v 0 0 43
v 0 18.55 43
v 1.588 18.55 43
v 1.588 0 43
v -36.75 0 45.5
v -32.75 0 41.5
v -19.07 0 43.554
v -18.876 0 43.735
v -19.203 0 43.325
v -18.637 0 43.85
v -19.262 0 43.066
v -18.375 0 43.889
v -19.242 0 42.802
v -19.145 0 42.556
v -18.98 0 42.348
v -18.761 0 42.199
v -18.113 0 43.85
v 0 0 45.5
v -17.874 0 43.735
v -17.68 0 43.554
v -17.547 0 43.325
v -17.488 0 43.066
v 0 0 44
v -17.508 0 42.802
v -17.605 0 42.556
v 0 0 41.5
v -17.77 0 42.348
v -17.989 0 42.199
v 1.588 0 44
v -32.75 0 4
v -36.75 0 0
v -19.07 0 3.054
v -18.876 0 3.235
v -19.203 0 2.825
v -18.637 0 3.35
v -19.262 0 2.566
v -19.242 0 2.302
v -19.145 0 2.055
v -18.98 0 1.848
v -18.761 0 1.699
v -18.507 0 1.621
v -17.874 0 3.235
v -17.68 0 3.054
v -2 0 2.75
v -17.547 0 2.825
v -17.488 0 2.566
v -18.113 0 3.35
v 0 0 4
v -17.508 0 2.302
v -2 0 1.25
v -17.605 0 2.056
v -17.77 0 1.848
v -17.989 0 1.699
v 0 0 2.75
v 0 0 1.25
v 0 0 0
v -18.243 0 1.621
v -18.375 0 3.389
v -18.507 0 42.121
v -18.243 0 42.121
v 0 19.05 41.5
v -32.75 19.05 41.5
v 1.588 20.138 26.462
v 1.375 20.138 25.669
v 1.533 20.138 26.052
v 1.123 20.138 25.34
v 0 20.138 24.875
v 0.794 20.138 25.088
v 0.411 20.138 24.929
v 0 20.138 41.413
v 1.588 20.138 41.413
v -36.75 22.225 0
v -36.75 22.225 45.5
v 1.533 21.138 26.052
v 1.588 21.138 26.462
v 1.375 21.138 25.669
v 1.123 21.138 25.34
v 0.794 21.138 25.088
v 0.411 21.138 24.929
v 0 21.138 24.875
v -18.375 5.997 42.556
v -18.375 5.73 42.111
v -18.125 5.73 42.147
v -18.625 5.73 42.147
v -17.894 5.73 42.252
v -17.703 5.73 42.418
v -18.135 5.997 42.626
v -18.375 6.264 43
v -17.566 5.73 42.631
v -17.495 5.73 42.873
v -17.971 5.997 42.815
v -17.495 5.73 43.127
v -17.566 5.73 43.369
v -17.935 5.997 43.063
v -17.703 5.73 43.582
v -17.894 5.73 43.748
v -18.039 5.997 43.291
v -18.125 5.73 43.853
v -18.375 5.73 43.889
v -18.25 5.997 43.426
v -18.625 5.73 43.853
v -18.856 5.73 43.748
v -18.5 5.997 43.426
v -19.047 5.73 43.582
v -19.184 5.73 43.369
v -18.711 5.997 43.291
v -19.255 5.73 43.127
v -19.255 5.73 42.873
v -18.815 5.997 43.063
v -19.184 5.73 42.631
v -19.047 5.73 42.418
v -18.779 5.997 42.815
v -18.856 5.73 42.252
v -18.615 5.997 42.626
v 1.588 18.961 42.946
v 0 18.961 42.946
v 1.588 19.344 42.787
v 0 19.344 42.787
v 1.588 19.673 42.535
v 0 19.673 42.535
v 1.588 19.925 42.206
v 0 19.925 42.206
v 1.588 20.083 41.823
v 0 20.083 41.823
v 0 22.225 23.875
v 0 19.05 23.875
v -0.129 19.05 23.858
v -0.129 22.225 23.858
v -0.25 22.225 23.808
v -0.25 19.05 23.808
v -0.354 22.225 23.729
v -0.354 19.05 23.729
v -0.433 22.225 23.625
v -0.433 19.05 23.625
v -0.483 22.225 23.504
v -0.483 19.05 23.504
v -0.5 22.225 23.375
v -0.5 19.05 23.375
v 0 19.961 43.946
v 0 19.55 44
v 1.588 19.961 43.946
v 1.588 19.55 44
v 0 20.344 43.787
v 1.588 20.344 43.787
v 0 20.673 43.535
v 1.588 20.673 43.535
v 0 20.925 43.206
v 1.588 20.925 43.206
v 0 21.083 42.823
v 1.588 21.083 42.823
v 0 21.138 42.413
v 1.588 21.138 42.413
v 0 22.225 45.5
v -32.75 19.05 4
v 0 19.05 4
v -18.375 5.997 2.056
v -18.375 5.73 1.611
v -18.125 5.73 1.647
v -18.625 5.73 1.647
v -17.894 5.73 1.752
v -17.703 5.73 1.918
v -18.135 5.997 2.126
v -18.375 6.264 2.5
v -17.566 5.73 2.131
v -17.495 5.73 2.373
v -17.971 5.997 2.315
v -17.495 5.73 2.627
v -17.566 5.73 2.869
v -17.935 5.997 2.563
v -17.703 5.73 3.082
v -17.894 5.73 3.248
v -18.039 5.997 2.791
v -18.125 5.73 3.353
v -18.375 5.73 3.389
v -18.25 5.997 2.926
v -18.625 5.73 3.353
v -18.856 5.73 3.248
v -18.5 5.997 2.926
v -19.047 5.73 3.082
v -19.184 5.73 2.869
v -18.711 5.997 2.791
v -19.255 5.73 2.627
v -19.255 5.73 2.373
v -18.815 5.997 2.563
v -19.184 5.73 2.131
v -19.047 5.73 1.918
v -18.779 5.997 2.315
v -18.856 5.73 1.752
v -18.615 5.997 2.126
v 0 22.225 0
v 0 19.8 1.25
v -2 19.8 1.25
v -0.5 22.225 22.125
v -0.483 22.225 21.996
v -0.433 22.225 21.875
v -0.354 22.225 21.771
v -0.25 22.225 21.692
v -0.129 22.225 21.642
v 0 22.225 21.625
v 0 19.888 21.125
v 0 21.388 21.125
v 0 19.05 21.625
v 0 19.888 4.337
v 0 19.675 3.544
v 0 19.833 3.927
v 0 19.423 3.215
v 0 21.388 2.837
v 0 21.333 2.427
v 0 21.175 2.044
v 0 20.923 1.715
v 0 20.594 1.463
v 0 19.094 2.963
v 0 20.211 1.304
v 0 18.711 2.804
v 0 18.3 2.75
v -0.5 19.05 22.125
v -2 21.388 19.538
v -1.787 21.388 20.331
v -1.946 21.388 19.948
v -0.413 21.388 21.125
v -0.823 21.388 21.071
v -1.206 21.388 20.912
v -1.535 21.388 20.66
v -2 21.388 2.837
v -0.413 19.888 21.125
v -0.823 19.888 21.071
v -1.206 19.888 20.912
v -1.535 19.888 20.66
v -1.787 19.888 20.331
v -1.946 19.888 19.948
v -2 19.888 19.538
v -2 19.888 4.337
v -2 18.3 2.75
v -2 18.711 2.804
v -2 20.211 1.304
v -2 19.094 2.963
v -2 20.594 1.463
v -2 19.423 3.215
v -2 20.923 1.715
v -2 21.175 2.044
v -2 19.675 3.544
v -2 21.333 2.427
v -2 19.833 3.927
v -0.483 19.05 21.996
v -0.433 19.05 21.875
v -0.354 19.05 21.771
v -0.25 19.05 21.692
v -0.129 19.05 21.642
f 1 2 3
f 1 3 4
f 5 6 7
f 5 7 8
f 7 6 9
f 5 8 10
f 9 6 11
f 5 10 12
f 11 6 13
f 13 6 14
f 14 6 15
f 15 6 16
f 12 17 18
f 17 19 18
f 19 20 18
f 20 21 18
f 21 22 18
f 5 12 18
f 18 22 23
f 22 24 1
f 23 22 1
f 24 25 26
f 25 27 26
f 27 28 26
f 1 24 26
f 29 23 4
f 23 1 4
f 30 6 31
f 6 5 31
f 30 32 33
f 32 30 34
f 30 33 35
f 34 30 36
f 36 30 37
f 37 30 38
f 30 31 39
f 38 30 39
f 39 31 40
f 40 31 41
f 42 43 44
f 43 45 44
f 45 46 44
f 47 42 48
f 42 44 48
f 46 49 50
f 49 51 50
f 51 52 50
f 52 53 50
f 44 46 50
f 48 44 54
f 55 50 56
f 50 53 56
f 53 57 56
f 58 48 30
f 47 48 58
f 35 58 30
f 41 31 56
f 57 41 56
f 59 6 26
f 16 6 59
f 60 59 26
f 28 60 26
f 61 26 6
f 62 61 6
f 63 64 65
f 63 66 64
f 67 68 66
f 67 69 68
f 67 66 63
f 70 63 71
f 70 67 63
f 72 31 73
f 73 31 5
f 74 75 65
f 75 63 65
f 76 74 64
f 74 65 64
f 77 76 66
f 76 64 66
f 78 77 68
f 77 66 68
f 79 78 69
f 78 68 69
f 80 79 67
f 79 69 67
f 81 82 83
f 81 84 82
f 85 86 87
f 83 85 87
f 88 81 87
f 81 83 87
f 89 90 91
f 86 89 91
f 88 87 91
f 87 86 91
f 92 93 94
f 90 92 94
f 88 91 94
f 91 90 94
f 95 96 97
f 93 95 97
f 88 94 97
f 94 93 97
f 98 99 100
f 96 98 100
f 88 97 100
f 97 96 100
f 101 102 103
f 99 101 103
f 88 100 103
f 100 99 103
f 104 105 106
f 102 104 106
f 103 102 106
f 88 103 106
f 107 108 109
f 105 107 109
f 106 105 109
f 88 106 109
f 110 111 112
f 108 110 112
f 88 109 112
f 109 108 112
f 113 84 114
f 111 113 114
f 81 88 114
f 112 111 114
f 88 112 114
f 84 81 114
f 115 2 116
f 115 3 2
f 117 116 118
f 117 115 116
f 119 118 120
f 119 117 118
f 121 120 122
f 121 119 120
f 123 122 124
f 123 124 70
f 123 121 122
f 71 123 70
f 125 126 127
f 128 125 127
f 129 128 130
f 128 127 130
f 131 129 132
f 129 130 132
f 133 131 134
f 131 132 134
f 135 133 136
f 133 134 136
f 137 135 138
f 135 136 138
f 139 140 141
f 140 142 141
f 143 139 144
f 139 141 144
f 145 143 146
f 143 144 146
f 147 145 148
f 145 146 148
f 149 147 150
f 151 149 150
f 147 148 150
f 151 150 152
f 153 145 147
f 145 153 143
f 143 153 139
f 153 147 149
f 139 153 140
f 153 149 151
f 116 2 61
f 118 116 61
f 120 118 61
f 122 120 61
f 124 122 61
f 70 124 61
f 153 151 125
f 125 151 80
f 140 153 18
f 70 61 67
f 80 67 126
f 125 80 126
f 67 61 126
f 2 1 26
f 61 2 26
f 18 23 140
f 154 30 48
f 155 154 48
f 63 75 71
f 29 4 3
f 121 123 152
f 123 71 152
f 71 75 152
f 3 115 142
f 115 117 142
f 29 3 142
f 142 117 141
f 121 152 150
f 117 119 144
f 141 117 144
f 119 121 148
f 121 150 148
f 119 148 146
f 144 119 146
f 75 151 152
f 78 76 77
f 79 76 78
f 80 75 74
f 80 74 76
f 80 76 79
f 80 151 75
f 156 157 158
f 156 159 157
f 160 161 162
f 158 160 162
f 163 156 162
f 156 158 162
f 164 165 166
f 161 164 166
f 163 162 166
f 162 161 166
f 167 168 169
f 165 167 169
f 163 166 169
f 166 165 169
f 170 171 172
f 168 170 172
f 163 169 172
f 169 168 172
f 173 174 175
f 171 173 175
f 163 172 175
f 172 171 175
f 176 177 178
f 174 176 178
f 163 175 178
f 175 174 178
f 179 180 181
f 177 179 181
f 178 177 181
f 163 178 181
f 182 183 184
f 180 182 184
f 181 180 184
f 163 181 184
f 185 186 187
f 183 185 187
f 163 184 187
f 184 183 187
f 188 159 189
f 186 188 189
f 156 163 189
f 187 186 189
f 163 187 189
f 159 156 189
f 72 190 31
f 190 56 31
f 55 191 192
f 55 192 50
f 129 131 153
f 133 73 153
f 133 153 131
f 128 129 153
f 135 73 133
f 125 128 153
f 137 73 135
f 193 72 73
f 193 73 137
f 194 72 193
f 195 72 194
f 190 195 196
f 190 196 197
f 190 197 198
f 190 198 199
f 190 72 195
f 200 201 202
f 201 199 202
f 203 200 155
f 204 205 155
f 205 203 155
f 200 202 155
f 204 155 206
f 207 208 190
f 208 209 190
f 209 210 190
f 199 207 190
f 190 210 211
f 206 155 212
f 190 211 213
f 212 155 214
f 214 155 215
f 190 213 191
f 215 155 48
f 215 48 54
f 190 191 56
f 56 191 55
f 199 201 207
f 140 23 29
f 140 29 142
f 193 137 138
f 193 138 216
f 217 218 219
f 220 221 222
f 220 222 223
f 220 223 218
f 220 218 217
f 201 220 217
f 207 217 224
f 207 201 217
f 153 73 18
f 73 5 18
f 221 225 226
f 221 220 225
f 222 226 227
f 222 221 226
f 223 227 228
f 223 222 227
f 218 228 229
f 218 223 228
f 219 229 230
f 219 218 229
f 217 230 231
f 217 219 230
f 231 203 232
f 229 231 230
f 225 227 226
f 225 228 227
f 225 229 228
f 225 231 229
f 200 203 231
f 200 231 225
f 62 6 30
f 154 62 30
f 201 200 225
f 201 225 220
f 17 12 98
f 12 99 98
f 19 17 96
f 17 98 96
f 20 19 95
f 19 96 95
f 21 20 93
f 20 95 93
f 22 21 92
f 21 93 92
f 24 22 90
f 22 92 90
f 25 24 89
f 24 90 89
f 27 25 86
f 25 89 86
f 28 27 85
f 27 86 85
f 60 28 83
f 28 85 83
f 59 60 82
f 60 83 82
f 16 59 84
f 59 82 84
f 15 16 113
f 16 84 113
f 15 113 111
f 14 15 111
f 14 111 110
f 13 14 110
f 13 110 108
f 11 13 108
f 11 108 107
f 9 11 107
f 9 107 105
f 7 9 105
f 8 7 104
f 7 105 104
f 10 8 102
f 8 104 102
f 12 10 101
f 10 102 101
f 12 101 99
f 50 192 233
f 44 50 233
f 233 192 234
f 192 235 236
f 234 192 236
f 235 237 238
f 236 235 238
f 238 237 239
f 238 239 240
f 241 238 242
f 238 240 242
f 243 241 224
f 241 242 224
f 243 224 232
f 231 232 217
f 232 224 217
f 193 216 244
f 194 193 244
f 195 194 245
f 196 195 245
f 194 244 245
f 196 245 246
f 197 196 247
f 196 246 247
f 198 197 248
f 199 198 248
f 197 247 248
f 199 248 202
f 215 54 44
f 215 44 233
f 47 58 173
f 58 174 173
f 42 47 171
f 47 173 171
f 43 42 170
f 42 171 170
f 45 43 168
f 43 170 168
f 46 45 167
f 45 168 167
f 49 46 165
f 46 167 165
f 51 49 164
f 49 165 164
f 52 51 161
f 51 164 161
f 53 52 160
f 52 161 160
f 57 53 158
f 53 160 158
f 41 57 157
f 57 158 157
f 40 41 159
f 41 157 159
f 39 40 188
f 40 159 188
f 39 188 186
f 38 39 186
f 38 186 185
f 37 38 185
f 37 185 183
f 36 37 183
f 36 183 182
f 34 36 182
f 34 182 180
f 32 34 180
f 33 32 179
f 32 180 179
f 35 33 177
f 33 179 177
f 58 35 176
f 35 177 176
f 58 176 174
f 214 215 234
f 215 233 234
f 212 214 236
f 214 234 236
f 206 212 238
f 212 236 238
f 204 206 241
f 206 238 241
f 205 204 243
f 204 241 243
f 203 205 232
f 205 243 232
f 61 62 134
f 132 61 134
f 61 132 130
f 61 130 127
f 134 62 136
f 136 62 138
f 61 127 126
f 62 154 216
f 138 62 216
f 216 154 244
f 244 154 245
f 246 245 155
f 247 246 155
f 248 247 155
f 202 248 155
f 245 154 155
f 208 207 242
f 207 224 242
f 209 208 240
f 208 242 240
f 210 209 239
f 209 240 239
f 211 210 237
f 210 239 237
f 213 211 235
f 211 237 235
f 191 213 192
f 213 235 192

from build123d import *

# Parameters (mm, degrees)
WALL_DEPTH                = 19.05
ROOF_START                = 19.05
ROOF_DEPTH                = 3.175
F_2_56_TAPPED_HOLE1_D     = 1.778
F_2_56_TAPPED_HOLE1_DEPTH = 5.73
F_2_56_TAPPED_HOLE1_TIP   = 0.53416509
BOSS_EXTRUDE1_DEPTH       = 1.5875
CUT_EXTRUDE3_DEPTH        = 2
FILLET1_R                 = 1.5875


with BuildPart() as part:
    # MainSketch → Wall (new body)
    with BuildSketch(Plane(origin=(0, 0, 0), x_dir=(1, 0, 0), z_dir=(0, 1, 0))):
        Polygon((-32.75, -4), (0, -4), (0, 0), (-36.75, 0), (-36.75, -45.5), (0, -45.5), (0, -41.5), (-32.75, -41.5), align=None)
    extrude(amount=WALL_DEPTH)

    # MainSketch<3> → Roof (add)
    with BuildSketch(Plane(origin=(0, 0, 0), x_dir=(1, 0, 0), z_dir=(0, 1, 0)).offset(ROOF_START)):
        with BuildLine():
            Line((0, -21.625), (0, 0))
            Line((0, 0), (-36.75, 0))
            Line((-36.75, 0), (-36.75, -45.5))
            Line((-36.75, -45.5), (0, -45.5))
            Line((0, -45.5), (0, -23.875))
            ThreePointArc((0, -23.875), (-0.353553391, -23.728553391), (-0.5, -23.375))
            Line((-0.5, -23.375), (-0.5, -22.125))
            ThreePointArc((-0.5, -22.125), (-0.353553391, -21.771446609), (0, -21.625))
        make_face()
    extrude(amount=ROOF_DEPTH)

    # #2-56 Tapped Hole1
    with Locations(Plane(origin=(-18.375, 0, 43), x_dir=(0, 0, -1), z_dir=(0, -1, 0))):
        with Locations((0, 0), (40.5, 0)):
            Hole(F_2_56_TAPPED_HOLE1_D / 2, depth=F_2_56_TAPPED_HOLE1_DEPTH)
            with Locations((0, 0, -(F_2_56_TAPPED_HOLE1_DEPTH + F_2_56_TAPPED_HOLE1_TIP / 2))):  # 118° drill point
                Cone(0, F_2_56_TAPPED_HOLE1_D / 2, F_2_56_TAPPED_HOLE1_TIP, mode=Mode.SUBTRACT)

    # Sketch3 → Boss-Extrude1 (add)
    with BuildSketch(Plane(origin=(0, 0, 0), x_dir=(0, 0, -1), z_dir=(1, 0, 0))):
        Polygon((-24.875, 21.1375), (-24.875, 20.1375), (-43, 20.1375), (-43, 0), (-44, 0), (-44, 21.1375), align=None)
    extrude(amount=BOSS_EXTRUDE1_DEPTH)

    # Sketch3<3> → Cut-Extrude3 (cut)
    with BuildSketch(Plane(origin=(0, 0, 0), x_dir=(0, 0, -1), z_dir=(1, 0, 0))):
        Polygon((-21.125, 19.8875), (-21.125, 21.3875), (-1.25, 21.3875), (-1.25, 0), (-2.75, 0), (-2.75, 19.8875), align=None)
    extrude(amount=-CUT_EXTRUDE3_DEPTH, mode=Mode.SUBTRACT)

    # Fillet1
    fillet1_edges = [part.edges().sort_by_distance(p)[0] for p in [
        (0.79375, 20.1375, 43),
        (0.79375, 21.1375, 44),
        (1.5875, 20.6375, 24.875),
        (-1, 21.3875, 1.25),
        (-1, 19.8875, 2.75),
        (-2, 20.6375, 21.125),
    ]]
    fillet(fillet1_edges, radius=FILLET1_R - 0.0001)  # a hair under: the kernel refuses the full size


solid = part.part
